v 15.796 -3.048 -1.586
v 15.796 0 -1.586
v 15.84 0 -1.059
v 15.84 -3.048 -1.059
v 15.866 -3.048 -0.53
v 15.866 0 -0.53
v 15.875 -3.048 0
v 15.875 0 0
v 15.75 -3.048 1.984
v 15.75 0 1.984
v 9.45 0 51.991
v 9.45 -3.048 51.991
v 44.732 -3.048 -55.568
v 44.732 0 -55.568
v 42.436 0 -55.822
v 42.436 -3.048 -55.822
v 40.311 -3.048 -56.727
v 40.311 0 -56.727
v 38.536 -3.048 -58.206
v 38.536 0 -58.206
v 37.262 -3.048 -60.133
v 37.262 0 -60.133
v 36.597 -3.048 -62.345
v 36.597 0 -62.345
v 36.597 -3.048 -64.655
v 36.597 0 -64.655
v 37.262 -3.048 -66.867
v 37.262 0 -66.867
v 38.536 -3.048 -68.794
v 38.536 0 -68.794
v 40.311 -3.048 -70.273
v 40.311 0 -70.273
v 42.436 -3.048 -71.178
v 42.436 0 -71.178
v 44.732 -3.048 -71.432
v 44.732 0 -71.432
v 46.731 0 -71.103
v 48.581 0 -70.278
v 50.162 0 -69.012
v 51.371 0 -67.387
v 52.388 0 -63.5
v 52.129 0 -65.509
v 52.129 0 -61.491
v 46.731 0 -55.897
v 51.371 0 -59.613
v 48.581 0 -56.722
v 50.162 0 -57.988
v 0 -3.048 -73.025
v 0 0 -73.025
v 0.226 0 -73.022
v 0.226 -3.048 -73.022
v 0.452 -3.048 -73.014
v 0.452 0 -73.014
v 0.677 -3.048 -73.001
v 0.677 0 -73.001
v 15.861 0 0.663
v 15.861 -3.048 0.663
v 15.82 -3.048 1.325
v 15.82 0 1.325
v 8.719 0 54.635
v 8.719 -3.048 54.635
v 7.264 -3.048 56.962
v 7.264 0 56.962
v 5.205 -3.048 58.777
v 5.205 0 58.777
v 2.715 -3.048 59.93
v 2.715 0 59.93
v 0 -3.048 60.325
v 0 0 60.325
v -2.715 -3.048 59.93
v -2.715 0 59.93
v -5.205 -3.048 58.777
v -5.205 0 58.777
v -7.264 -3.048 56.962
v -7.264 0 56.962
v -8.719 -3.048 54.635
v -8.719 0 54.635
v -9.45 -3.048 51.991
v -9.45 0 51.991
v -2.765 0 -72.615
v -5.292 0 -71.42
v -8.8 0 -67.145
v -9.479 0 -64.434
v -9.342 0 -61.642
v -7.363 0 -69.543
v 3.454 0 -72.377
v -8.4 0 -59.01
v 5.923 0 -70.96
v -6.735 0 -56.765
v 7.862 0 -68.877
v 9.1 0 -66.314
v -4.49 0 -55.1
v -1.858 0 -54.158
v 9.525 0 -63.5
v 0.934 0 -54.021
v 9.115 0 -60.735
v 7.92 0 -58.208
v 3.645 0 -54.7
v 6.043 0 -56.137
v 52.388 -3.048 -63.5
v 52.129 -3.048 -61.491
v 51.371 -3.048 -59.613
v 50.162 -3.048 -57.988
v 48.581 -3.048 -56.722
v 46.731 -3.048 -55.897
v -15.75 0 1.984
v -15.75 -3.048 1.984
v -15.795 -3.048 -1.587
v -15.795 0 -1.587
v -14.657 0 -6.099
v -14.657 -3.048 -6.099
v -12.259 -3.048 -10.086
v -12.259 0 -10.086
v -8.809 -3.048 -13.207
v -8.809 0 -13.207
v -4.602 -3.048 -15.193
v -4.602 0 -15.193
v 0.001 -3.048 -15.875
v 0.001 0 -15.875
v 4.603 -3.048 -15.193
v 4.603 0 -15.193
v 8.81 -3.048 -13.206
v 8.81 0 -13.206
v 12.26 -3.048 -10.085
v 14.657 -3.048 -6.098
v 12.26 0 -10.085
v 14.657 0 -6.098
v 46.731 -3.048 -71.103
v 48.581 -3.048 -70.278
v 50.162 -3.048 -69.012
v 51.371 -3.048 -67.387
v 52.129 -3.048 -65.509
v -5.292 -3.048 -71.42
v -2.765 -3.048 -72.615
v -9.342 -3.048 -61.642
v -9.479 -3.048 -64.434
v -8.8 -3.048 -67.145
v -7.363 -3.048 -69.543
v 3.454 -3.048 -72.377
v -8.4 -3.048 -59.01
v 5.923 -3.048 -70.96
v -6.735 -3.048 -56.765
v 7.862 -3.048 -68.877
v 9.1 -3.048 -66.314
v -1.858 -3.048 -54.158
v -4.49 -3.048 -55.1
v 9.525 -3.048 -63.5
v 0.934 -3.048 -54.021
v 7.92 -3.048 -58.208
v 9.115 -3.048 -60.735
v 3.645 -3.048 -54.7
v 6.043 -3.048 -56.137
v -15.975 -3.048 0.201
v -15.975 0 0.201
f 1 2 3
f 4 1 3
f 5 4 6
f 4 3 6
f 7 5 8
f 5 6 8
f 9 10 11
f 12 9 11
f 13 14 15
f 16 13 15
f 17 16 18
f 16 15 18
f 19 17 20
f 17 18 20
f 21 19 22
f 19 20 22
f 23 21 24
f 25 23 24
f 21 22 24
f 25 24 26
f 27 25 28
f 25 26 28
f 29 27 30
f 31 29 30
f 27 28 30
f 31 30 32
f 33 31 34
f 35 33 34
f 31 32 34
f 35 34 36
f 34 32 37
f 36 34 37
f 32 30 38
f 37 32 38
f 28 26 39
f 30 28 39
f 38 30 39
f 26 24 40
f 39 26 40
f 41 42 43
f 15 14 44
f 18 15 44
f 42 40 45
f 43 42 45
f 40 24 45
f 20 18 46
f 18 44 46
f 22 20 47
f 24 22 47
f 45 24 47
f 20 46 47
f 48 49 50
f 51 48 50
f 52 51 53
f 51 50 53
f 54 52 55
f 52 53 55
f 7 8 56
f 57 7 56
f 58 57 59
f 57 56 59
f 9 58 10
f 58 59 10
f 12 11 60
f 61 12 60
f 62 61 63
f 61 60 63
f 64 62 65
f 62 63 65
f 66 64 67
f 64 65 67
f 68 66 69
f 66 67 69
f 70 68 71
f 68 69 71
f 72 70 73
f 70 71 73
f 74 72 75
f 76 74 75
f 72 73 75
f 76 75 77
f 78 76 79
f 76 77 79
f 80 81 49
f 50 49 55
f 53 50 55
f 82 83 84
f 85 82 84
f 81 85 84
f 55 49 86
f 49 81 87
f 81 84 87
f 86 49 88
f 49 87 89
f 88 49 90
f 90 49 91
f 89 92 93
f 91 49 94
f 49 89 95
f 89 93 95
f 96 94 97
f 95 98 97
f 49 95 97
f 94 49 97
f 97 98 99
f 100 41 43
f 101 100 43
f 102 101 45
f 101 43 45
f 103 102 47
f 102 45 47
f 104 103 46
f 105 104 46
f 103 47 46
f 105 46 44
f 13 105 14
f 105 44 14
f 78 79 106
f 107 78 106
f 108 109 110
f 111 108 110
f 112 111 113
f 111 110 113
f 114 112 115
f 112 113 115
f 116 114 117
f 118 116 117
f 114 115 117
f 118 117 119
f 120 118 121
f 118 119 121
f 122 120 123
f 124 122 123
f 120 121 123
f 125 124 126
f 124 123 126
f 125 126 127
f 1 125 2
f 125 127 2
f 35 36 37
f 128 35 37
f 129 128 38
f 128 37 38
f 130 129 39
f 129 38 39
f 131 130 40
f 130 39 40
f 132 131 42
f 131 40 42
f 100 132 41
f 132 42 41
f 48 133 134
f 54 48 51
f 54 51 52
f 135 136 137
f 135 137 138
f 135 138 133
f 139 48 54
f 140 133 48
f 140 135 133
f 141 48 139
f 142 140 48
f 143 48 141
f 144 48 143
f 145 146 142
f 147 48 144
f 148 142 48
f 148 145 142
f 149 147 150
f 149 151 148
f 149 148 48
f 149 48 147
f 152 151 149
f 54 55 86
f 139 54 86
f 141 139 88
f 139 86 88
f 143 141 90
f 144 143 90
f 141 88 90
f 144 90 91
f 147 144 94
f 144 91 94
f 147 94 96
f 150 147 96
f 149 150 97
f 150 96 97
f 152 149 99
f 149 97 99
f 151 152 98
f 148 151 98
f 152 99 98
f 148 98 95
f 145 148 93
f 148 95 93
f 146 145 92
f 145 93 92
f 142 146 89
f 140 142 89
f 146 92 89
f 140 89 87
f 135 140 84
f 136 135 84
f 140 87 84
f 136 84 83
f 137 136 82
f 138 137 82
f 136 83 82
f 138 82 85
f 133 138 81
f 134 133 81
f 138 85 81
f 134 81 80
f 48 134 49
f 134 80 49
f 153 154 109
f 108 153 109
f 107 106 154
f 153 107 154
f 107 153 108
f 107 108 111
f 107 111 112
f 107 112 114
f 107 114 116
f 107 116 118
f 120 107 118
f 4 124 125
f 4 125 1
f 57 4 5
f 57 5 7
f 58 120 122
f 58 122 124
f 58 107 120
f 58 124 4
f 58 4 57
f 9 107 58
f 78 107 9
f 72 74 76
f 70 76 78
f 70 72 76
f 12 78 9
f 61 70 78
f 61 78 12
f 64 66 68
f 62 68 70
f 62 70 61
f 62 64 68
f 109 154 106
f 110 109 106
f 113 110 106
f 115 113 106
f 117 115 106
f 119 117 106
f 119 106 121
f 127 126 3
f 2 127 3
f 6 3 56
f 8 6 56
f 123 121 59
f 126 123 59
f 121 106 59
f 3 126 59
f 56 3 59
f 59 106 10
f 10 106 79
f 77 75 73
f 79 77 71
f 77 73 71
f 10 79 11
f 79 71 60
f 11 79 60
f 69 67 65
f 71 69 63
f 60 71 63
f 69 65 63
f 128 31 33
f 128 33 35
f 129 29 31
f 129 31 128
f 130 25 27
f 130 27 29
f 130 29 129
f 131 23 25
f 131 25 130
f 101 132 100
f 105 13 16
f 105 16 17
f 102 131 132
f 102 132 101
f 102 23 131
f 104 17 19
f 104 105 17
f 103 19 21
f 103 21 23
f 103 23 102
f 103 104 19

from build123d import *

# Parameters (mm, degrees)
F0_R     = 4.391456
F0_R_2   = 3.038562
F0_R_3   = 4.328218
F1_DEPTH = 3.048


with BuildPart() as f1:
    # F0 (on Front) → F1 (new body)
    with BuildSketch(Plane.XZ):
        with BuildLine():
            ThreePointArc((-9.450293, 51.990625), (-0.596483, 41.293695), (9.525, 50.8))
            ThreePointArc((9.525, 50.8), (9.506305, 51.396483), (9.450293, 51.990625))
            ThreePointArc((9.450293, 51.990625), (0, 60.325), (-9.450293, 51.990625))
        make_face()
        with Locations((0, 50.8)):
            Circle(F0_R, mode=Mode.SUBTRACT)
        with BuildLine():
            ThreePointArc((9.450293, 51.990625), (9.506305, 51.396483), (9.525, 50.8))
            ThreePointArc((9.525, 50.8), (-0.596483, 41.293695), (-9.450293, 51.990625))
            Line((-9.450293, 51.990625), (-15.750488, 1.984375))
            ThreePointArc((-15.750488, 1.984375), (0, 15.875), (15.750488, 1.984375))
            Line((15.750488, 1.984375), (9.450293, 51.990625))
        make_face()
        with Locations((-0.136438, 36.5252)):
            Circle(F0_R_2, mode=Mode.SUBTRACT)
        with BuildLine():
            ThreePointArc((0, -73.025), (0.338886, -73.01897), (0.677344, -73.000886))
            Line((0.677344, -73.000886), (0, -73.025))
        make_face()
        with BuildLine():
            Line((0, -73.025), (0.677344, -73.000886))
            ThreePointArc((0.677344, -73.000886), (6.970557, -69.991299), (9.525, -63.5))
            ThreePointArc((9.525, -63.5), (-6.735192, -56.764808), (0, -73.025))
        make_face()
        with Locations((0, -63.5)):
            Circle(F0_R_3, mode=Mode.SUBTRACT)
        with BuildLine():
            ThreePointArc((52.3875, -63.5), (50.161633, -57.98809), (44.732405, -55.567525))
            ThreePointArc((44.732405, -55.567525), (36.5125, -63.5), (44.732405, -71.432475))
            ThreePointArc((44.732405, -71.432475), (50.161633, -69.01191), (52.3875, -63.5))
        make_face()
        with Locations((44.45, -63.5)):
            Circle(F0_R_3, mode=Mode.SUBTRACT)
        with BuildLine():
            ThreePointArc((15.875, 0), (15.843841, 0.994139), (15.750488, 1.984375))
            ThreePointArc((15.750488, 1.984375), (0, 15.875), (-15.750488, 1.984375))
            ThreePointArc((-15.750488, 1.984375), (-15.873744, 0.199705), (-15.795426, -1.5875))
            ThreePointArc((-15.795426, -1.5875), (0.000548, -15.875), (15.795535, -1.58641))
            ThreePointArc((15.795535, -1.58641), (15.855121, -0.794199), (15.875, 0))
        make_face()
        Circle(F0_R, mode=Mode.SUBTRACT)
        with BuildLine():
            ThreePointArc((-15.795426, -1.5875), (-15.873744, 0.199705), (-15.750488, 1.984375))
            Line((-15.750488, 1.984375), (-15.975175, 0.200982))
            Line((-15.975175, 0.200982), (-15.795426, -1.5875))
        make_face()
        with Locations((0, 50.8)):
            Circle(F0_R)
        Circle(F0_R)
        with Locations((0, -63.5)):
            Circle(F0_R_3)
        with Locations((44.45, -63.5)):
            Circle(F0_R_3)
        with Locations((-0.136438, 36.5252)):
            Circle(F0_R_2)
    extrude(amount=F1_DEPTH)


solid = f1.part
